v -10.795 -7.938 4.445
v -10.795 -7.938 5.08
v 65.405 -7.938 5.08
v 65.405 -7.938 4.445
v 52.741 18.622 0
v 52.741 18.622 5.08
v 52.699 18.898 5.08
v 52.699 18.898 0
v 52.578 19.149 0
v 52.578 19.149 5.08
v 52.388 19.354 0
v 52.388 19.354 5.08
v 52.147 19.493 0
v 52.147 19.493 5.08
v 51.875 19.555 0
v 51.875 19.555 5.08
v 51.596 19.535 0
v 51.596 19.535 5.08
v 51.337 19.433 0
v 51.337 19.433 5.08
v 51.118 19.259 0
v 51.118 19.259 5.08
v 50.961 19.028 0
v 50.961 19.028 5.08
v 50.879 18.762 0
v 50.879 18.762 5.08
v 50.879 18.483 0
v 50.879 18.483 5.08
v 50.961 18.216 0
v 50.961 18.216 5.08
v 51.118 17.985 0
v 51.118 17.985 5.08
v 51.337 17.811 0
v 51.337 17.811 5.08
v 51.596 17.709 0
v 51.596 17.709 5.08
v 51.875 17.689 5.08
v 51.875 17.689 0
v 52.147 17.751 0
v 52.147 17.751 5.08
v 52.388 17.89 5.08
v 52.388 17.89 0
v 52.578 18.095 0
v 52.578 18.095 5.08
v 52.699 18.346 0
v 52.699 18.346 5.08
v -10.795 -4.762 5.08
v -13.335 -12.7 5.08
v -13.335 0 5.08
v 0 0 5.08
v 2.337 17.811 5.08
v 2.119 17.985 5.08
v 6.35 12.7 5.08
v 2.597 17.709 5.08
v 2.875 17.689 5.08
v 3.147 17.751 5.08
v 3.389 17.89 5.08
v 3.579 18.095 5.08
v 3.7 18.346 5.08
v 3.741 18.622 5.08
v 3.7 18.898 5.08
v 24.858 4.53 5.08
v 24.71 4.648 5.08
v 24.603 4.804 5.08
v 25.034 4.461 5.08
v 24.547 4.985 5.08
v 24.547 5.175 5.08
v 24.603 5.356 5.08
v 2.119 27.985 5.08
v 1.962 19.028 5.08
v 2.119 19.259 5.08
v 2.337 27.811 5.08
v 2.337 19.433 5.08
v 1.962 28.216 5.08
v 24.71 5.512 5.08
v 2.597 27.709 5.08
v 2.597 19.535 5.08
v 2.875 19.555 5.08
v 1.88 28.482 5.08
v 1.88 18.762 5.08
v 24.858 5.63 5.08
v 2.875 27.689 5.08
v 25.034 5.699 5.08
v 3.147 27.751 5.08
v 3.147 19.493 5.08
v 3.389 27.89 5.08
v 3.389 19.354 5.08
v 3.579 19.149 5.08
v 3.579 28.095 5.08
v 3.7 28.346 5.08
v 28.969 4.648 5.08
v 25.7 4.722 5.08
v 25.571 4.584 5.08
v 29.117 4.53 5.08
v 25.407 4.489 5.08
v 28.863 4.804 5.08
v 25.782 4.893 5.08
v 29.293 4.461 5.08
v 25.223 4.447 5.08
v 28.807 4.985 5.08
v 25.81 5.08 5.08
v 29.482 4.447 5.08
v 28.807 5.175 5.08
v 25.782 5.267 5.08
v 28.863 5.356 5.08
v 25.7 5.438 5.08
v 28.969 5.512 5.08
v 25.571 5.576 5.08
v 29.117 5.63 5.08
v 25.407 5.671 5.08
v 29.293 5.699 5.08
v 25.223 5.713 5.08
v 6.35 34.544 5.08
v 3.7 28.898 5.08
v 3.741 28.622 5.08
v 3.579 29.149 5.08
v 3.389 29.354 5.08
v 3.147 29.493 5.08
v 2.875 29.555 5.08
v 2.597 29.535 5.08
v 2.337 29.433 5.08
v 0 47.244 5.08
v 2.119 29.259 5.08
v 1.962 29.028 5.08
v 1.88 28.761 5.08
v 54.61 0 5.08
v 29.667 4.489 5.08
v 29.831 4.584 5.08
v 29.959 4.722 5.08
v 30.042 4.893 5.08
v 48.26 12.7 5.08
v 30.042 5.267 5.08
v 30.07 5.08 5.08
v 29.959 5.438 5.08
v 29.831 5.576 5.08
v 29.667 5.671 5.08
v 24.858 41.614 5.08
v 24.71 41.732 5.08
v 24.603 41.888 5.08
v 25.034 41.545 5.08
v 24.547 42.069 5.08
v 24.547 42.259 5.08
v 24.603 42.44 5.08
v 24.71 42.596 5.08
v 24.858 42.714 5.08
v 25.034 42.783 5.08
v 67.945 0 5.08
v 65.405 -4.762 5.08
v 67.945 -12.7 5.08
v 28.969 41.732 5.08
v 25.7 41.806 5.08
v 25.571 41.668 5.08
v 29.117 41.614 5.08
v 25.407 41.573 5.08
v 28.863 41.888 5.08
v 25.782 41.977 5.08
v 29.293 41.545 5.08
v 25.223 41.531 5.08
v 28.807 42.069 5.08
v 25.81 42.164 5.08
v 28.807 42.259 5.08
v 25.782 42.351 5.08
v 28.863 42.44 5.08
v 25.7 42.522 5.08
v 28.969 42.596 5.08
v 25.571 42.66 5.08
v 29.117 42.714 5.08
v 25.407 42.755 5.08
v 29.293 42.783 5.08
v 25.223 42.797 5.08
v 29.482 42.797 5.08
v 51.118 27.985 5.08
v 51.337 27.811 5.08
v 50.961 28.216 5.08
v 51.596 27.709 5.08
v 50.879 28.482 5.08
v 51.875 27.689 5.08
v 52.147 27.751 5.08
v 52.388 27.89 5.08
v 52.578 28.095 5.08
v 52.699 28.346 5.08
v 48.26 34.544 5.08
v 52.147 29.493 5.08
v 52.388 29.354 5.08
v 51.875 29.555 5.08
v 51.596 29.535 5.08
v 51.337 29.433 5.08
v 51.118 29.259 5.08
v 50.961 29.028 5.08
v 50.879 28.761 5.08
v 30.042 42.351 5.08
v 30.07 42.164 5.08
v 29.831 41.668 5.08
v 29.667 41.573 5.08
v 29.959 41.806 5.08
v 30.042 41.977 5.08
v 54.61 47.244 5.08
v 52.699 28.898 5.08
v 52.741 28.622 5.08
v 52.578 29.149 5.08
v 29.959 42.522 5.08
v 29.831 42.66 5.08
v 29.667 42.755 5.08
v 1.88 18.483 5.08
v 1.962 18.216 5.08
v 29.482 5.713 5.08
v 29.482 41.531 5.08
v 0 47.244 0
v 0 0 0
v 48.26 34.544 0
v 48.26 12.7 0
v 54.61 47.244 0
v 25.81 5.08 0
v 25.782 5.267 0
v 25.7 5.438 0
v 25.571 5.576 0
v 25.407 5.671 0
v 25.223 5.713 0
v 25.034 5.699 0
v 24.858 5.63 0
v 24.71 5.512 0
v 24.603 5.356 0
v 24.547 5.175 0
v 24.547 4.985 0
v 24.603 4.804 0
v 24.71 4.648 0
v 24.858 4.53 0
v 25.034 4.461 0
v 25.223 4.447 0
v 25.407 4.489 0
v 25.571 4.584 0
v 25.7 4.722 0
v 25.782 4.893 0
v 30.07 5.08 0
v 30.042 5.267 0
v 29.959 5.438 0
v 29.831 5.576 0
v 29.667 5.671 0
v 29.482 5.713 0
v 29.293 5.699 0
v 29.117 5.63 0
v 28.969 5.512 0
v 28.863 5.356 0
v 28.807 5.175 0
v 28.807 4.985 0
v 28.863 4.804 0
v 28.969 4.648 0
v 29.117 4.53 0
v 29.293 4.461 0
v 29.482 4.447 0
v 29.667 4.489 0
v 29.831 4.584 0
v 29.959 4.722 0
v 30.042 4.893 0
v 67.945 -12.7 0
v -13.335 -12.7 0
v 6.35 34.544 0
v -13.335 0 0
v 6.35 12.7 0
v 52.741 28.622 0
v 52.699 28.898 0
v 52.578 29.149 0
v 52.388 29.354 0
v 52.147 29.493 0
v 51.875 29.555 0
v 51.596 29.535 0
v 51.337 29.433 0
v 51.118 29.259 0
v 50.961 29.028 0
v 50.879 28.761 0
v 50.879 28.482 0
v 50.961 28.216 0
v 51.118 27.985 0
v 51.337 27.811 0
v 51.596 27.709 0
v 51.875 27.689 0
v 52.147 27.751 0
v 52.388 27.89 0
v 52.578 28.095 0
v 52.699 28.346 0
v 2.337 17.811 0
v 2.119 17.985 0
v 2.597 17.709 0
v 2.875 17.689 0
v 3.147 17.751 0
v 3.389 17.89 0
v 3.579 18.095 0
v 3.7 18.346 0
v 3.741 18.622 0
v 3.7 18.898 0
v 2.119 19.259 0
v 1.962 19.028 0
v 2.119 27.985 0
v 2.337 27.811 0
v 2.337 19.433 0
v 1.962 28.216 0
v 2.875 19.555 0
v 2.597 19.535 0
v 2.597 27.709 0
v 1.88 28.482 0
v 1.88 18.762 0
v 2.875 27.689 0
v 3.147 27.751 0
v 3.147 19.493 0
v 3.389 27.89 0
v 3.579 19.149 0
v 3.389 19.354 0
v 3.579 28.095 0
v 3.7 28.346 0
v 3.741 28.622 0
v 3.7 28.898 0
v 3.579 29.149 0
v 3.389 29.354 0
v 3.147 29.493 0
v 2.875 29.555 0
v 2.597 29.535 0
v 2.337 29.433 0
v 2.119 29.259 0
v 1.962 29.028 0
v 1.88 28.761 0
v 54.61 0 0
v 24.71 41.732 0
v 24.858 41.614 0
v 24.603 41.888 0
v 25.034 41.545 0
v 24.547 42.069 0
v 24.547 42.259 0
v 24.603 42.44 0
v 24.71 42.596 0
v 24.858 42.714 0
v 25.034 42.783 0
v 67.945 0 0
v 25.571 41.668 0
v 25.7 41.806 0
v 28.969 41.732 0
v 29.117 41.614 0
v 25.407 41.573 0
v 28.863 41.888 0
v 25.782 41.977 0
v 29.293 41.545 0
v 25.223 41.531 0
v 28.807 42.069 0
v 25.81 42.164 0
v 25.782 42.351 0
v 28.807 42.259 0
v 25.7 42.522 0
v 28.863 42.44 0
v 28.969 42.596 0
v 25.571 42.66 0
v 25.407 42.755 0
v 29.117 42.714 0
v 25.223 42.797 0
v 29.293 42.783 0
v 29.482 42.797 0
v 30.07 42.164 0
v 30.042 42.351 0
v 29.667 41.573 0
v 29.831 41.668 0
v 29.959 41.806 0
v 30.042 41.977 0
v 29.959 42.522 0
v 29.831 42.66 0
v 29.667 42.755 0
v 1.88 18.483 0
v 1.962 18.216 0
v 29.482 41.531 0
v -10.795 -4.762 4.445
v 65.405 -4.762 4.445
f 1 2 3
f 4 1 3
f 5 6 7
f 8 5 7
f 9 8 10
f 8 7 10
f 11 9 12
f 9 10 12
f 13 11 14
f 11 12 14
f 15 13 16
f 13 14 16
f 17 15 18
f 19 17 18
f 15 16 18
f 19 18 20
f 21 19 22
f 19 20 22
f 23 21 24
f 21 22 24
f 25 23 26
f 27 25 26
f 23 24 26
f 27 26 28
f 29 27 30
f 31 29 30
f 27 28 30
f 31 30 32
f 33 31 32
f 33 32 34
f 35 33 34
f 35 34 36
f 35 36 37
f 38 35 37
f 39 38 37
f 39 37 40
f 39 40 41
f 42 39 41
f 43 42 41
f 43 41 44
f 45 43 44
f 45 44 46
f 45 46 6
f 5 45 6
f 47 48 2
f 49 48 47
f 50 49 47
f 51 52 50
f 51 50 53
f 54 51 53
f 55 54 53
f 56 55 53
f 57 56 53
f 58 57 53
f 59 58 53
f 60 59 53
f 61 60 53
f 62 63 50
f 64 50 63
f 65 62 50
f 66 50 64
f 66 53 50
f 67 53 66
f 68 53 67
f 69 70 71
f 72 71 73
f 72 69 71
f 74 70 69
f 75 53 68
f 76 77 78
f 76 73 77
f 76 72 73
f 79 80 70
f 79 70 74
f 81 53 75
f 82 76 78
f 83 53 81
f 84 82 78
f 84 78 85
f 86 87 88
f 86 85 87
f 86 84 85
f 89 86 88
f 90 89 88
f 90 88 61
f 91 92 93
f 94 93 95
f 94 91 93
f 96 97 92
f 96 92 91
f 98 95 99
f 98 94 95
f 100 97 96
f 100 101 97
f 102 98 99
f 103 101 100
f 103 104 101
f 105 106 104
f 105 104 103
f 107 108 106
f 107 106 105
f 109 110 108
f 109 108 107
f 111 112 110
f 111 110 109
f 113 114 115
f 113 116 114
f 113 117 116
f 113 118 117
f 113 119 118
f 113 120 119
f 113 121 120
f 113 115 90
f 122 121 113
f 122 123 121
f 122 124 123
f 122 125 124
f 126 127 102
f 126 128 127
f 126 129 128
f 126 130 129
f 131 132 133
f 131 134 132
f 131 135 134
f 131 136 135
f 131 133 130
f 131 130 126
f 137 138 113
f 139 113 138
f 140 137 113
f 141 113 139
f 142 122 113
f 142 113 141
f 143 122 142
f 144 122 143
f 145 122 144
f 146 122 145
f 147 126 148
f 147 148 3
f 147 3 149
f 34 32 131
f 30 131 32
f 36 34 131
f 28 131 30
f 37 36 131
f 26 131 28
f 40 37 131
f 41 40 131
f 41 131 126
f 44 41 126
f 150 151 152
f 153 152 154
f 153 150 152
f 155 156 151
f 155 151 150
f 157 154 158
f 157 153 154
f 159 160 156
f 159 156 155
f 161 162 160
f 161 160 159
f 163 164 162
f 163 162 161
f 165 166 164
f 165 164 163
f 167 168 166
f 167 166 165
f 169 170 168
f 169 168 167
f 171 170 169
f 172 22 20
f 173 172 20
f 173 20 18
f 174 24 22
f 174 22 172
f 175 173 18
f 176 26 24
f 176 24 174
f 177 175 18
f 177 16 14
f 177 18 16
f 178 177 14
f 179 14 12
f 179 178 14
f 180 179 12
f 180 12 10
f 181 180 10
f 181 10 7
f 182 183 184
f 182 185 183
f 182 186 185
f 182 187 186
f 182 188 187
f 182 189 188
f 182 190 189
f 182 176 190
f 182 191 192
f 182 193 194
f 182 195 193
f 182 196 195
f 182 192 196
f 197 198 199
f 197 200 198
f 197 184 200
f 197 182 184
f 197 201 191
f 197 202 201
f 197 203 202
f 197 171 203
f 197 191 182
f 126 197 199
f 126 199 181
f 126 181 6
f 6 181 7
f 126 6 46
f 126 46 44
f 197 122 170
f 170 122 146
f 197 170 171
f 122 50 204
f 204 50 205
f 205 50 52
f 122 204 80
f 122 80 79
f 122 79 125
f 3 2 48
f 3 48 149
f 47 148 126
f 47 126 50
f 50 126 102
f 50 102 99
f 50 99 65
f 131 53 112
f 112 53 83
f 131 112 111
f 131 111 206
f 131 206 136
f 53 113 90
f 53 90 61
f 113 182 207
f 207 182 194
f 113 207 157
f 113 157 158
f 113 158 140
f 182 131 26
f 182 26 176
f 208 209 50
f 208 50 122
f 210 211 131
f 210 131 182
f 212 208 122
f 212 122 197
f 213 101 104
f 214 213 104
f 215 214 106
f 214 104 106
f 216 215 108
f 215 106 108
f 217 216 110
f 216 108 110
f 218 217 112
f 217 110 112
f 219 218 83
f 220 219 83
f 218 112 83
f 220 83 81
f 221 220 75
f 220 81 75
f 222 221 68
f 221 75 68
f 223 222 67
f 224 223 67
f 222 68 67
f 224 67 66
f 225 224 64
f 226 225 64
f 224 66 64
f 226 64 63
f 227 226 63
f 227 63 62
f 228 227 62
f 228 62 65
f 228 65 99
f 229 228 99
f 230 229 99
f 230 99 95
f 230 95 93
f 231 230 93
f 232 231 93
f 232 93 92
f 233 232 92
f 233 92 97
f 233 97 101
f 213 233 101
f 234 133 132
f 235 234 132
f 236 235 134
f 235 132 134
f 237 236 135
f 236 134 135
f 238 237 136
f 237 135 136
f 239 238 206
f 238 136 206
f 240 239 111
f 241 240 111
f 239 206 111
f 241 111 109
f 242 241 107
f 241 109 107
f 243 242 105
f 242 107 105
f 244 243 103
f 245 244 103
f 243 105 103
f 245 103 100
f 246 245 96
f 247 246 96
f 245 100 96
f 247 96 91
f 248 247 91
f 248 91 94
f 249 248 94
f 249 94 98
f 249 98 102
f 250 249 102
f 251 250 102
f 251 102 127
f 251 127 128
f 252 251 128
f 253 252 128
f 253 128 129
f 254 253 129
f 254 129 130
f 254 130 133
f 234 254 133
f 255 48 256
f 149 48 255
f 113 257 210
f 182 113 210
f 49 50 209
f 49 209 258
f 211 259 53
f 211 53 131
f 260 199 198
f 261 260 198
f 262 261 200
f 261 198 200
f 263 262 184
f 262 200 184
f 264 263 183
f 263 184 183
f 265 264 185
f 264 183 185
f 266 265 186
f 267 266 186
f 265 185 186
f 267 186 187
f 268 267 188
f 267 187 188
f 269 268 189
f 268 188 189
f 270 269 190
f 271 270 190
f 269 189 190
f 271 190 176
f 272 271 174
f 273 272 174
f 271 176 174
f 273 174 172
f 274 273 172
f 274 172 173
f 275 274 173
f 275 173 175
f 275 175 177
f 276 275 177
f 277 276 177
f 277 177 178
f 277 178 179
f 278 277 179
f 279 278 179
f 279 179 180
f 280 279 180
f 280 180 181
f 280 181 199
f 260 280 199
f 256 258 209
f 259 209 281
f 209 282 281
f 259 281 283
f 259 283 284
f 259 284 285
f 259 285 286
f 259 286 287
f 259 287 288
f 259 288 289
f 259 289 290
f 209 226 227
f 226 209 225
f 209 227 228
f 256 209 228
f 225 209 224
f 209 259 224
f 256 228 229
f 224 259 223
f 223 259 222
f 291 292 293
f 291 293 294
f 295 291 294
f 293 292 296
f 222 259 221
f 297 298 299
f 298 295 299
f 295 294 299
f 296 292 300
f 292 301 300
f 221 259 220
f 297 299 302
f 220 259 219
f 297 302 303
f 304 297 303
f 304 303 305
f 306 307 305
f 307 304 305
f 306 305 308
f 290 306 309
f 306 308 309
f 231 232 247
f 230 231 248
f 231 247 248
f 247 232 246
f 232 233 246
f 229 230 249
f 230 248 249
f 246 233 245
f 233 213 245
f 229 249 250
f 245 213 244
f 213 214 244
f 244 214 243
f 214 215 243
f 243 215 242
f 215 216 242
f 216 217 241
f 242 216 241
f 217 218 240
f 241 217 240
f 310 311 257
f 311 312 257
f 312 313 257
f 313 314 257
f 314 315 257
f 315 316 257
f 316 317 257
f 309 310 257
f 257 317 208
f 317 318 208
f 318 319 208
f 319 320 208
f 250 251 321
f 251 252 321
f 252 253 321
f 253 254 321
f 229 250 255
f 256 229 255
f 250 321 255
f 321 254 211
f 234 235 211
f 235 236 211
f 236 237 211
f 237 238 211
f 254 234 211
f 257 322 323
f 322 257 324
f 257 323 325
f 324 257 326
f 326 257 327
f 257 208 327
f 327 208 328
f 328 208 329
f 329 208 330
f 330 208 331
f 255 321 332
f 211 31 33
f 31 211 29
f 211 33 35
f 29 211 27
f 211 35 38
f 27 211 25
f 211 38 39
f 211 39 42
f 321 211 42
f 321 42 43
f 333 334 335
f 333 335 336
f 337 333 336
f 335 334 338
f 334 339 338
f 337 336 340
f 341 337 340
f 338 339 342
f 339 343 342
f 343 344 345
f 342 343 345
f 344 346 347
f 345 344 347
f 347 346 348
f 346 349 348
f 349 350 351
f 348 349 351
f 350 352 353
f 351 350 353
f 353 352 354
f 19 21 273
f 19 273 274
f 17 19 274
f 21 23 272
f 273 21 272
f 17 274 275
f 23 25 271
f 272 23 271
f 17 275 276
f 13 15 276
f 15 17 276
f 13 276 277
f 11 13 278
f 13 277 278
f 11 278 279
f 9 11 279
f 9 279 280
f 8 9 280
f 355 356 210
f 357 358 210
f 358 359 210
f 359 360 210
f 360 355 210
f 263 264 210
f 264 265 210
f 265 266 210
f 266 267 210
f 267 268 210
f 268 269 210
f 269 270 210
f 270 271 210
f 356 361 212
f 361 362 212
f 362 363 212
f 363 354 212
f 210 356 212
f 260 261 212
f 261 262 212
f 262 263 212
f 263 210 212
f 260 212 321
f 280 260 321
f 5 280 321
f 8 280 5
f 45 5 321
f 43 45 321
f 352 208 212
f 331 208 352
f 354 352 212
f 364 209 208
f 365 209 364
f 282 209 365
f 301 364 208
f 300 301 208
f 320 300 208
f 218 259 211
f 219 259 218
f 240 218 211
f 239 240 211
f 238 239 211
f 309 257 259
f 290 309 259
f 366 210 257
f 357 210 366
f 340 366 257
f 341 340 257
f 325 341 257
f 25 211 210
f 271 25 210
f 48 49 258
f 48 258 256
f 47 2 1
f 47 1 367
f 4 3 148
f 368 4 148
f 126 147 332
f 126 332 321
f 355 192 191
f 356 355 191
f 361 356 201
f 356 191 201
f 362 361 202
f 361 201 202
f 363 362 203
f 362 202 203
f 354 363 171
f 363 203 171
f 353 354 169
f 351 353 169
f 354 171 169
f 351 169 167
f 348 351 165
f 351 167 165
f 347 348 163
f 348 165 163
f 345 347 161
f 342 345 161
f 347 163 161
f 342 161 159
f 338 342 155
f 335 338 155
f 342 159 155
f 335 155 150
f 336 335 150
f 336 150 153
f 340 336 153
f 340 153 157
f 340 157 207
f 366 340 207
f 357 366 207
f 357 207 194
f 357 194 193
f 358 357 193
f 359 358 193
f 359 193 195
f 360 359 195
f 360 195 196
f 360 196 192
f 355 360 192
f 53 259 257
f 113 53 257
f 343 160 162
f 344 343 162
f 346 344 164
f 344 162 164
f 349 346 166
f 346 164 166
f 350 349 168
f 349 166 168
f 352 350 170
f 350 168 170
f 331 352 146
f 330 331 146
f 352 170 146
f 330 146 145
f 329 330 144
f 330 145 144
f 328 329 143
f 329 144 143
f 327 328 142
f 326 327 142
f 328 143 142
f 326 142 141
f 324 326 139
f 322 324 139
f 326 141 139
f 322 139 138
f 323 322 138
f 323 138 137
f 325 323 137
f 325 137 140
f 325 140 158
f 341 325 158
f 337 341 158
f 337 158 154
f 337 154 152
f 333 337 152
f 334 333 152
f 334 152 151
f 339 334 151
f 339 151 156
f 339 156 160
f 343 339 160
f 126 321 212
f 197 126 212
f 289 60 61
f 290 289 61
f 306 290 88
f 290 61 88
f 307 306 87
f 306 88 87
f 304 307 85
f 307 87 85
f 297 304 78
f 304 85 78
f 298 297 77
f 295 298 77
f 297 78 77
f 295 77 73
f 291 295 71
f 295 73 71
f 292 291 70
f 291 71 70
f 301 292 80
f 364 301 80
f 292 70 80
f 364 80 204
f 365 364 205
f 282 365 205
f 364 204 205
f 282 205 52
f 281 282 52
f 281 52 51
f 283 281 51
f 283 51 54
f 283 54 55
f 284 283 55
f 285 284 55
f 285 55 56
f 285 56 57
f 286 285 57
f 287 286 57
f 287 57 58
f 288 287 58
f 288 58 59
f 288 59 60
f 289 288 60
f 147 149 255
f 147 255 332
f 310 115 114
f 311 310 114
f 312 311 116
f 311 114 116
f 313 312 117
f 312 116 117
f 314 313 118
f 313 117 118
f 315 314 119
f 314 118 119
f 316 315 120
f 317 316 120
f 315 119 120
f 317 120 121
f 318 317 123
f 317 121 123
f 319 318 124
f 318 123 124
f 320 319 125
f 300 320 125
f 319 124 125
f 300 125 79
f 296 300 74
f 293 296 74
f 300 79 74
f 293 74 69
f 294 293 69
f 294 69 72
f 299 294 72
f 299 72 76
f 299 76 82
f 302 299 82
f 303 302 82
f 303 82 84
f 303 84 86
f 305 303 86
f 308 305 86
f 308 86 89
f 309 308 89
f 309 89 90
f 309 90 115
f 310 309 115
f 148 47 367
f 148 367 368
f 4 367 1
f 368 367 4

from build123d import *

# Parameters (mm, degrees)
SKETCH1_W           = 54.61
SKETCH1_H           = 47.244
SKETCH1_W_2         = 41.91
SKETCH1_H_2         = 21.844
BOSS_EXTRUDE1_DEPTH = 5.08
SKETCH2_R           = 0.93599
SKETCH2_R_2         = 0.635
CUT_EXTRUDE1_DEPTH  = 73.388217522
BOSS_EXTRUDE3_DEPTH = 5.08
SKETCH9_W           = 76.2
SKETCH9_H           = 3.175
CUT_EXTRUDE2_DEPTH  = 0.635


with BuildPart() as part:
    # Sketch1 → Boss-Extrude1 (new body)
    with BuildSketch(Plane.XY):
        with Locations((27.305, 23.622)):
            Rectangle(SKETCH1_W, SKETCH1_H)
        with Locations((27.305, 23.622)):
            Rectangle(SKETCH1_W_2, SKETCH1_H_2, mode=Mode.SUBTRACT)
    extrude(amount=BOSS_EXTRUDE1_DEPTH)

    # Sketch2 → Cut-Extrude1 (cut, through all)
    with BuildSketch(Plane.XY.offset(5.08)):
        with Locations((2.80543, 28.62199)):
            Circle(SKETCH2_R)
        with Locations((2.80543, 18.62201)):
            Circle(SKETCH2_R)
        with Locations((51.80457, 28.62199)):
            Circle(SKETCH2_R)
        with Locations((51.80457, 18.62201)):
            Circle(SKETCH2_R)
        with Locations((25.17521, 5.08)):
            Circle(SKETCH2_R_2)
        with Locations((29.43479, 5.08)):
            Circle(SKETCH2_R_2)
        with Locations((29.43479, 42.164)):
            Circle(SKETCH2_R_2)
        with Locations((25.17521, 42.164)):
            Circle(SKETCH2_R_2)
    extrude(amount=-CUT_EXTRUDE1_DEPTH, mode=Mode.SUBTRACT)

    # Sketch8 → Boss-Extrude3 (add)
    with BuildSketch(Plane.XY.offset(5.08)):
        Polygon((0, 0), (-13.335, 0), (-13.335, -12.7), (67.945, -12.7), (67.945, 0), (54.61, 0), align=None)
    extrude(amount=-BOSS_EXTRUDE3_DEPTH)

    # Sketch9 → Cut-Extrude2 (cut)
    with BuildSketch(Plane.XY.offset(5.08)):
        with Locations((27.305, -6.35)):
            Rectangle(SKETCH9_W, SKETCH9_H)
    extrude(amount=-CUT_EXTRUDE2_DEPTH, mode=Mode.SUBTRACT)


solid = part.part
